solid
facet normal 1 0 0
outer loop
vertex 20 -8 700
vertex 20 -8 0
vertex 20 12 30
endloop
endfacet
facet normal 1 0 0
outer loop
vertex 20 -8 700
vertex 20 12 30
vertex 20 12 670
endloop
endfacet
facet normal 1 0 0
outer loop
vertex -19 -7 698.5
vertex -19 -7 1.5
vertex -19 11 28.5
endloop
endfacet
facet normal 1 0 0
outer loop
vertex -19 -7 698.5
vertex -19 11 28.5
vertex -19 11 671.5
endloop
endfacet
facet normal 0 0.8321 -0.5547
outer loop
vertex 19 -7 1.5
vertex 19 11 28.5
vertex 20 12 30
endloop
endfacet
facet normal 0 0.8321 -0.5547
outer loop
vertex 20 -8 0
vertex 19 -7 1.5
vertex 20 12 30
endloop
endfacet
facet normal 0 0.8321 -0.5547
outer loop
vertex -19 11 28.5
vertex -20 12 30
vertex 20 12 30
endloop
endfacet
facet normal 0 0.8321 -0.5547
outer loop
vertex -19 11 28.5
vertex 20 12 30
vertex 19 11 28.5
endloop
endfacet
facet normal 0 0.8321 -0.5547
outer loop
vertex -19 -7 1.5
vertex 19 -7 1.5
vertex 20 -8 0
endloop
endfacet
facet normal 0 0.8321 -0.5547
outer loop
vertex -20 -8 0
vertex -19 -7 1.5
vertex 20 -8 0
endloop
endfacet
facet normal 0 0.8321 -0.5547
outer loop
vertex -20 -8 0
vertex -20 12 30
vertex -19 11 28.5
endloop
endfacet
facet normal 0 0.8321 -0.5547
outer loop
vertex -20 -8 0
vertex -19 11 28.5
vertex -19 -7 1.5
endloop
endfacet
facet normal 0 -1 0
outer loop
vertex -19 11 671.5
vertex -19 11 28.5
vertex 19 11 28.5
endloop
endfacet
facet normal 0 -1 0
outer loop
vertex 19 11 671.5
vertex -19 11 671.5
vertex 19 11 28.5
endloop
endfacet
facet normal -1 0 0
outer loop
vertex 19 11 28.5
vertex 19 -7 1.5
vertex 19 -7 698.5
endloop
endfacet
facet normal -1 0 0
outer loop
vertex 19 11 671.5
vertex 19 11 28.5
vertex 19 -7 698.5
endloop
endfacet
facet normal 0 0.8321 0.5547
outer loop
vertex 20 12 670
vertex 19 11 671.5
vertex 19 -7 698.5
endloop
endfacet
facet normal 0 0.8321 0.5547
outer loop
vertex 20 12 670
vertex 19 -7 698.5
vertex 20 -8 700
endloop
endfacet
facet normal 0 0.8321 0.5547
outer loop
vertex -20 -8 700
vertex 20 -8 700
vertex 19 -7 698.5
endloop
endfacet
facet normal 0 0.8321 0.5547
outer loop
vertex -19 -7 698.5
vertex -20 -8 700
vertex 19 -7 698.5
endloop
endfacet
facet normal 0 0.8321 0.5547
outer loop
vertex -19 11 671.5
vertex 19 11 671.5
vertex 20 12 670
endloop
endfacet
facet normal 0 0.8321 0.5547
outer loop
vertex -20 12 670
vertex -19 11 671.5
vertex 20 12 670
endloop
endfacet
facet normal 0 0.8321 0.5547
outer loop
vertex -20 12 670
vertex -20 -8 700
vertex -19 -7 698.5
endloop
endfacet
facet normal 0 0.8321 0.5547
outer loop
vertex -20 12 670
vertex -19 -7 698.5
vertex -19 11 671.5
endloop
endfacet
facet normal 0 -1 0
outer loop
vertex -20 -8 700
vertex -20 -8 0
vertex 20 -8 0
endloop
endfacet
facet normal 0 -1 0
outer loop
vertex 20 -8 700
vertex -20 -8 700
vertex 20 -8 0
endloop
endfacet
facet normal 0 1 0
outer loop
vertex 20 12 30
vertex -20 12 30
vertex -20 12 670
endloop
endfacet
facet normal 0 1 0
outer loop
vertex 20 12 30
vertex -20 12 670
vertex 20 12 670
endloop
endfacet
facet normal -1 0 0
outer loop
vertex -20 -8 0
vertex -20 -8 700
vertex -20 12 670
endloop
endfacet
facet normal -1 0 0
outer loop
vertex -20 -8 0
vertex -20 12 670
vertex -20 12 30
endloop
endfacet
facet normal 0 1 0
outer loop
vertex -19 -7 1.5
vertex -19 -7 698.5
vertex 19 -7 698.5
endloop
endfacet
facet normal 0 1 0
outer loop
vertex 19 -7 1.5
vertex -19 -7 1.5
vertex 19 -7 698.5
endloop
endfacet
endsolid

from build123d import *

# Parameters (mm, degrees)
BOSS_EXTRUDE1_DEPTH = 700
SKETCH4_W           = 38
SKETCH4_H           = 18
CUT_EXTRUDE2_DEPTH  = 701
CUT_EXTRUDE1_DEPTH  = 41


with BuildPart() as part:
    # Sketch1 → Boss-Extrude1 (new body)
    with BuildSketch(Plane.XY):
        Polygon((20, -8), (0, -8), (-20, -8), (-20, 12), (20, 12), align=None)
    extrude(amount=BOSS_EXTRUDE1_DEPTH)

    # Sketch4 → Cut-Extrude2 (cut, through all)
    with BuildSketch(Plane.XY.offset(700)):
        with Locations((0, 2)):
            Rectangle(SKETCH4_W, SKETCH4_H)
    extrude(amount=-CUT_EXTRUDE2_DEPTH, mode=Mode.SUBTRACT)

    # Sketch3 → Cut-Extrude1 (cut, through all)
    with BuildSketch(Plane.ZY.offset(20)):
        Polygon((0, 12), (30, 12), (0, -8), align=None)
        Polygon((670, 12), (700, 12), (700, -8), align=None)
    extrude(amount=-CUT_EXTRUDE1_DEPTH, mode=Mode.SUBTRACT)


solid = part.part
